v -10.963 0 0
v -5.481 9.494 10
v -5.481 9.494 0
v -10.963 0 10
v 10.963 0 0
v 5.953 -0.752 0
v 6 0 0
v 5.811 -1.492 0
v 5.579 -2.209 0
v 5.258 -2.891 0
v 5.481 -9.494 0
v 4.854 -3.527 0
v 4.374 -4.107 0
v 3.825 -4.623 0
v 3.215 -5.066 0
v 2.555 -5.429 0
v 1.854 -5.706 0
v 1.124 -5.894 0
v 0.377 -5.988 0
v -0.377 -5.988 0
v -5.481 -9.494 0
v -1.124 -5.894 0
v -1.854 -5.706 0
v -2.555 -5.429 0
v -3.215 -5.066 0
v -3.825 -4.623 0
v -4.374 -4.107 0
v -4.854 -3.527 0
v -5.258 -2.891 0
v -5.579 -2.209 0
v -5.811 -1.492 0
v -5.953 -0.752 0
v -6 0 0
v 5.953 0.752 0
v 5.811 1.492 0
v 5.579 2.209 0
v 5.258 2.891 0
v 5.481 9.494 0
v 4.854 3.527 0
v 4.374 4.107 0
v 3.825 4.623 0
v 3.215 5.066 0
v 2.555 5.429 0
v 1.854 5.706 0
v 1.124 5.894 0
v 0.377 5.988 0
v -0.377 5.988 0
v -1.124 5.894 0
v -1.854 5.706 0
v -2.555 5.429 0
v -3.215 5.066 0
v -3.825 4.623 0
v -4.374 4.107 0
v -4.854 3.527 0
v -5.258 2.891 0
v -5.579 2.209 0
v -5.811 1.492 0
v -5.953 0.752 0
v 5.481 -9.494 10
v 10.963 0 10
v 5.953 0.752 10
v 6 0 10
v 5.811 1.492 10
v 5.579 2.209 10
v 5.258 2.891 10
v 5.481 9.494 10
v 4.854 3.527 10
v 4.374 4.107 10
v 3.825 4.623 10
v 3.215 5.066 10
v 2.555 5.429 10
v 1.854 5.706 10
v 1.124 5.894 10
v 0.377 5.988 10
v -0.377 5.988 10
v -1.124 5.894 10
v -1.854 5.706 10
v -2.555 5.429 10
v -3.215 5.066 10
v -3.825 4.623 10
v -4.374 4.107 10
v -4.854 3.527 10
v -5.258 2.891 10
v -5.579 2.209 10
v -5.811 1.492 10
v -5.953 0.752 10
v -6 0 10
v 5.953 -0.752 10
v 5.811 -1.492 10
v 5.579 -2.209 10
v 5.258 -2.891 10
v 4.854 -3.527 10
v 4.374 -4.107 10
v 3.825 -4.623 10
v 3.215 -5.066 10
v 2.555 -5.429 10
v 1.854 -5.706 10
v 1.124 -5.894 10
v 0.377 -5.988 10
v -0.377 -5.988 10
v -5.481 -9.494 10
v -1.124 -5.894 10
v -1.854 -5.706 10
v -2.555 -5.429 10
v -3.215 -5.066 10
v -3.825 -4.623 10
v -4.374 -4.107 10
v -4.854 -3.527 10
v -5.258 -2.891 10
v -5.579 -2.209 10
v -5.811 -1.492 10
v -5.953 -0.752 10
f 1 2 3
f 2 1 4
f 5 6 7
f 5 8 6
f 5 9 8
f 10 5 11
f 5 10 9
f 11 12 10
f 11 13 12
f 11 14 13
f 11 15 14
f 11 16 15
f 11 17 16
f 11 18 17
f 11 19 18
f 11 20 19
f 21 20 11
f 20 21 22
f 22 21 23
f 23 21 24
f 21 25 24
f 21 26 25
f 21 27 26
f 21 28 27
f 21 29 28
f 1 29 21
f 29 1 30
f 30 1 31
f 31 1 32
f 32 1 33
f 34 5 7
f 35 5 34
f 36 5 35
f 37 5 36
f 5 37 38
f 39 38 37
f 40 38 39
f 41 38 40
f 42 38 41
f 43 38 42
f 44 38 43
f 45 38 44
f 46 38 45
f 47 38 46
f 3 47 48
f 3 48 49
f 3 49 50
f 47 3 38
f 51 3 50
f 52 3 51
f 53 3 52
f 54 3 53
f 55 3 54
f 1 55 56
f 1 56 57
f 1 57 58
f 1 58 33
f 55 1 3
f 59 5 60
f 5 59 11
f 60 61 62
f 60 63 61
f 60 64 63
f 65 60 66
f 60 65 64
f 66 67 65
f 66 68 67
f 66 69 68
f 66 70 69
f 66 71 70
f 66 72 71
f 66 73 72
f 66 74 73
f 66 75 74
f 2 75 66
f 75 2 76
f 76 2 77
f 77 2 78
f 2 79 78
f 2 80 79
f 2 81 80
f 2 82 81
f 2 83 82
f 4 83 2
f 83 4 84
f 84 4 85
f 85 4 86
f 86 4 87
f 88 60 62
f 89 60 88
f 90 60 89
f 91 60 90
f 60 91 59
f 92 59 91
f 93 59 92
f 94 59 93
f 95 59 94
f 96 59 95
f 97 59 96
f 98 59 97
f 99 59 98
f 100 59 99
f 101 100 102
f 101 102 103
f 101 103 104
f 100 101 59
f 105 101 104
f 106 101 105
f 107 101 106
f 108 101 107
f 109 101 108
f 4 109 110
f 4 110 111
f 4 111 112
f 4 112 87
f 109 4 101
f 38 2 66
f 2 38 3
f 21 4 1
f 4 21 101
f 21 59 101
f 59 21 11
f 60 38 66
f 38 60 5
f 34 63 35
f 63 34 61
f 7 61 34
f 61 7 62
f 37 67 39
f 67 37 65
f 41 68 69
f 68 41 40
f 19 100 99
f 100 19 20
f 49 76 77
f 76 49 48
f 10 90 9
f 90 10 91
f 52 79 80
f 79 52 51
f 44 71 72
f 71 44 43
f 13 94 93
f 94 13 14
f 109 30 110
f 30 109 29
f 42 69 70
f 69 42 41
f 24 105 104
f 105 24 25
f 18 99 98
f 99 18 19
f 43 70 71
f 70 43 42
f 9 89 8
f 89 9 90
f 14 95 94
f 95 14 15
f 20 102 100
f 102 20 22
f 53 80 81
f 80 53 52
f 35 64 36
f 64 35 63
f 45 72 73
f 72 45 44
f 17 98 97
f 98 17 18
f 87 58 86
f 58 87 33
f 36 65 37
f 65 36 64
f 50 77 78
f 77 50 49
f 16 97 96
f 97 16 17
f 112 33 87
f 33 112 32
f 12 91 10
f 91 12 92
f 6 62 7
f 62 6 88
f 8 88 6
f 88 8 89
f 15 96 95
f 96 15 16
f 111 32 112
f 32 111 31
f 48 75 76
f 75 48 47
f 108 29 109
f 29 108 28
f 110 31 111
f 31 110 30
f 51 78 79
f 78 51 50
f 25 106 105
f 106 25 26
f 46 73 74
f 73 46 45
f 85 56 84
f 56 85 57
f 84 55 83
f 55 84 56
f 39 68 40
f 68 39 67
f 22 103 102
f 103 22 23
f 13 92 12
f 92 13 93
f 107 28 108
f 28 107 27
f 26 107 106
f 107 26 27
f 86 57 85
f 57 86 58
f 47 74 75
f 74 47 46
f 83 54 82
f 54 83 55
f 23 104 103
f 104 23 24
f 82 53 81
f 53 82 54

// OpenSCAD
$fn = 50;


difference() {
	union() {
		translate(v = [0, 0, 0]) {
			rotate(a = [0, 0, 0]) {
				translate(v = [0, 0, 0]) {
					rotate(a = [0, 0, 0]) {
						linear_extrude(height = 10) {
							polygon(points = [[10.9630000000, 0.0000000000], [5.4815000000, 9.4942365017], [-5.4815000000, 9.4942365017], [-10.9630000000, 0.0000000000], [-5.4815000000, -9.4942365017], [5.4815000000, -9.4942365017]]);
						}
					}
				}
			}
		}
	}
	union() {
		#translate(v = [0, 0, -10]) {
			rotate(a = [0, 0, 0]) {
				cylinder(h = 100, r = 6.0000000000);
			}
		}
	}
}
